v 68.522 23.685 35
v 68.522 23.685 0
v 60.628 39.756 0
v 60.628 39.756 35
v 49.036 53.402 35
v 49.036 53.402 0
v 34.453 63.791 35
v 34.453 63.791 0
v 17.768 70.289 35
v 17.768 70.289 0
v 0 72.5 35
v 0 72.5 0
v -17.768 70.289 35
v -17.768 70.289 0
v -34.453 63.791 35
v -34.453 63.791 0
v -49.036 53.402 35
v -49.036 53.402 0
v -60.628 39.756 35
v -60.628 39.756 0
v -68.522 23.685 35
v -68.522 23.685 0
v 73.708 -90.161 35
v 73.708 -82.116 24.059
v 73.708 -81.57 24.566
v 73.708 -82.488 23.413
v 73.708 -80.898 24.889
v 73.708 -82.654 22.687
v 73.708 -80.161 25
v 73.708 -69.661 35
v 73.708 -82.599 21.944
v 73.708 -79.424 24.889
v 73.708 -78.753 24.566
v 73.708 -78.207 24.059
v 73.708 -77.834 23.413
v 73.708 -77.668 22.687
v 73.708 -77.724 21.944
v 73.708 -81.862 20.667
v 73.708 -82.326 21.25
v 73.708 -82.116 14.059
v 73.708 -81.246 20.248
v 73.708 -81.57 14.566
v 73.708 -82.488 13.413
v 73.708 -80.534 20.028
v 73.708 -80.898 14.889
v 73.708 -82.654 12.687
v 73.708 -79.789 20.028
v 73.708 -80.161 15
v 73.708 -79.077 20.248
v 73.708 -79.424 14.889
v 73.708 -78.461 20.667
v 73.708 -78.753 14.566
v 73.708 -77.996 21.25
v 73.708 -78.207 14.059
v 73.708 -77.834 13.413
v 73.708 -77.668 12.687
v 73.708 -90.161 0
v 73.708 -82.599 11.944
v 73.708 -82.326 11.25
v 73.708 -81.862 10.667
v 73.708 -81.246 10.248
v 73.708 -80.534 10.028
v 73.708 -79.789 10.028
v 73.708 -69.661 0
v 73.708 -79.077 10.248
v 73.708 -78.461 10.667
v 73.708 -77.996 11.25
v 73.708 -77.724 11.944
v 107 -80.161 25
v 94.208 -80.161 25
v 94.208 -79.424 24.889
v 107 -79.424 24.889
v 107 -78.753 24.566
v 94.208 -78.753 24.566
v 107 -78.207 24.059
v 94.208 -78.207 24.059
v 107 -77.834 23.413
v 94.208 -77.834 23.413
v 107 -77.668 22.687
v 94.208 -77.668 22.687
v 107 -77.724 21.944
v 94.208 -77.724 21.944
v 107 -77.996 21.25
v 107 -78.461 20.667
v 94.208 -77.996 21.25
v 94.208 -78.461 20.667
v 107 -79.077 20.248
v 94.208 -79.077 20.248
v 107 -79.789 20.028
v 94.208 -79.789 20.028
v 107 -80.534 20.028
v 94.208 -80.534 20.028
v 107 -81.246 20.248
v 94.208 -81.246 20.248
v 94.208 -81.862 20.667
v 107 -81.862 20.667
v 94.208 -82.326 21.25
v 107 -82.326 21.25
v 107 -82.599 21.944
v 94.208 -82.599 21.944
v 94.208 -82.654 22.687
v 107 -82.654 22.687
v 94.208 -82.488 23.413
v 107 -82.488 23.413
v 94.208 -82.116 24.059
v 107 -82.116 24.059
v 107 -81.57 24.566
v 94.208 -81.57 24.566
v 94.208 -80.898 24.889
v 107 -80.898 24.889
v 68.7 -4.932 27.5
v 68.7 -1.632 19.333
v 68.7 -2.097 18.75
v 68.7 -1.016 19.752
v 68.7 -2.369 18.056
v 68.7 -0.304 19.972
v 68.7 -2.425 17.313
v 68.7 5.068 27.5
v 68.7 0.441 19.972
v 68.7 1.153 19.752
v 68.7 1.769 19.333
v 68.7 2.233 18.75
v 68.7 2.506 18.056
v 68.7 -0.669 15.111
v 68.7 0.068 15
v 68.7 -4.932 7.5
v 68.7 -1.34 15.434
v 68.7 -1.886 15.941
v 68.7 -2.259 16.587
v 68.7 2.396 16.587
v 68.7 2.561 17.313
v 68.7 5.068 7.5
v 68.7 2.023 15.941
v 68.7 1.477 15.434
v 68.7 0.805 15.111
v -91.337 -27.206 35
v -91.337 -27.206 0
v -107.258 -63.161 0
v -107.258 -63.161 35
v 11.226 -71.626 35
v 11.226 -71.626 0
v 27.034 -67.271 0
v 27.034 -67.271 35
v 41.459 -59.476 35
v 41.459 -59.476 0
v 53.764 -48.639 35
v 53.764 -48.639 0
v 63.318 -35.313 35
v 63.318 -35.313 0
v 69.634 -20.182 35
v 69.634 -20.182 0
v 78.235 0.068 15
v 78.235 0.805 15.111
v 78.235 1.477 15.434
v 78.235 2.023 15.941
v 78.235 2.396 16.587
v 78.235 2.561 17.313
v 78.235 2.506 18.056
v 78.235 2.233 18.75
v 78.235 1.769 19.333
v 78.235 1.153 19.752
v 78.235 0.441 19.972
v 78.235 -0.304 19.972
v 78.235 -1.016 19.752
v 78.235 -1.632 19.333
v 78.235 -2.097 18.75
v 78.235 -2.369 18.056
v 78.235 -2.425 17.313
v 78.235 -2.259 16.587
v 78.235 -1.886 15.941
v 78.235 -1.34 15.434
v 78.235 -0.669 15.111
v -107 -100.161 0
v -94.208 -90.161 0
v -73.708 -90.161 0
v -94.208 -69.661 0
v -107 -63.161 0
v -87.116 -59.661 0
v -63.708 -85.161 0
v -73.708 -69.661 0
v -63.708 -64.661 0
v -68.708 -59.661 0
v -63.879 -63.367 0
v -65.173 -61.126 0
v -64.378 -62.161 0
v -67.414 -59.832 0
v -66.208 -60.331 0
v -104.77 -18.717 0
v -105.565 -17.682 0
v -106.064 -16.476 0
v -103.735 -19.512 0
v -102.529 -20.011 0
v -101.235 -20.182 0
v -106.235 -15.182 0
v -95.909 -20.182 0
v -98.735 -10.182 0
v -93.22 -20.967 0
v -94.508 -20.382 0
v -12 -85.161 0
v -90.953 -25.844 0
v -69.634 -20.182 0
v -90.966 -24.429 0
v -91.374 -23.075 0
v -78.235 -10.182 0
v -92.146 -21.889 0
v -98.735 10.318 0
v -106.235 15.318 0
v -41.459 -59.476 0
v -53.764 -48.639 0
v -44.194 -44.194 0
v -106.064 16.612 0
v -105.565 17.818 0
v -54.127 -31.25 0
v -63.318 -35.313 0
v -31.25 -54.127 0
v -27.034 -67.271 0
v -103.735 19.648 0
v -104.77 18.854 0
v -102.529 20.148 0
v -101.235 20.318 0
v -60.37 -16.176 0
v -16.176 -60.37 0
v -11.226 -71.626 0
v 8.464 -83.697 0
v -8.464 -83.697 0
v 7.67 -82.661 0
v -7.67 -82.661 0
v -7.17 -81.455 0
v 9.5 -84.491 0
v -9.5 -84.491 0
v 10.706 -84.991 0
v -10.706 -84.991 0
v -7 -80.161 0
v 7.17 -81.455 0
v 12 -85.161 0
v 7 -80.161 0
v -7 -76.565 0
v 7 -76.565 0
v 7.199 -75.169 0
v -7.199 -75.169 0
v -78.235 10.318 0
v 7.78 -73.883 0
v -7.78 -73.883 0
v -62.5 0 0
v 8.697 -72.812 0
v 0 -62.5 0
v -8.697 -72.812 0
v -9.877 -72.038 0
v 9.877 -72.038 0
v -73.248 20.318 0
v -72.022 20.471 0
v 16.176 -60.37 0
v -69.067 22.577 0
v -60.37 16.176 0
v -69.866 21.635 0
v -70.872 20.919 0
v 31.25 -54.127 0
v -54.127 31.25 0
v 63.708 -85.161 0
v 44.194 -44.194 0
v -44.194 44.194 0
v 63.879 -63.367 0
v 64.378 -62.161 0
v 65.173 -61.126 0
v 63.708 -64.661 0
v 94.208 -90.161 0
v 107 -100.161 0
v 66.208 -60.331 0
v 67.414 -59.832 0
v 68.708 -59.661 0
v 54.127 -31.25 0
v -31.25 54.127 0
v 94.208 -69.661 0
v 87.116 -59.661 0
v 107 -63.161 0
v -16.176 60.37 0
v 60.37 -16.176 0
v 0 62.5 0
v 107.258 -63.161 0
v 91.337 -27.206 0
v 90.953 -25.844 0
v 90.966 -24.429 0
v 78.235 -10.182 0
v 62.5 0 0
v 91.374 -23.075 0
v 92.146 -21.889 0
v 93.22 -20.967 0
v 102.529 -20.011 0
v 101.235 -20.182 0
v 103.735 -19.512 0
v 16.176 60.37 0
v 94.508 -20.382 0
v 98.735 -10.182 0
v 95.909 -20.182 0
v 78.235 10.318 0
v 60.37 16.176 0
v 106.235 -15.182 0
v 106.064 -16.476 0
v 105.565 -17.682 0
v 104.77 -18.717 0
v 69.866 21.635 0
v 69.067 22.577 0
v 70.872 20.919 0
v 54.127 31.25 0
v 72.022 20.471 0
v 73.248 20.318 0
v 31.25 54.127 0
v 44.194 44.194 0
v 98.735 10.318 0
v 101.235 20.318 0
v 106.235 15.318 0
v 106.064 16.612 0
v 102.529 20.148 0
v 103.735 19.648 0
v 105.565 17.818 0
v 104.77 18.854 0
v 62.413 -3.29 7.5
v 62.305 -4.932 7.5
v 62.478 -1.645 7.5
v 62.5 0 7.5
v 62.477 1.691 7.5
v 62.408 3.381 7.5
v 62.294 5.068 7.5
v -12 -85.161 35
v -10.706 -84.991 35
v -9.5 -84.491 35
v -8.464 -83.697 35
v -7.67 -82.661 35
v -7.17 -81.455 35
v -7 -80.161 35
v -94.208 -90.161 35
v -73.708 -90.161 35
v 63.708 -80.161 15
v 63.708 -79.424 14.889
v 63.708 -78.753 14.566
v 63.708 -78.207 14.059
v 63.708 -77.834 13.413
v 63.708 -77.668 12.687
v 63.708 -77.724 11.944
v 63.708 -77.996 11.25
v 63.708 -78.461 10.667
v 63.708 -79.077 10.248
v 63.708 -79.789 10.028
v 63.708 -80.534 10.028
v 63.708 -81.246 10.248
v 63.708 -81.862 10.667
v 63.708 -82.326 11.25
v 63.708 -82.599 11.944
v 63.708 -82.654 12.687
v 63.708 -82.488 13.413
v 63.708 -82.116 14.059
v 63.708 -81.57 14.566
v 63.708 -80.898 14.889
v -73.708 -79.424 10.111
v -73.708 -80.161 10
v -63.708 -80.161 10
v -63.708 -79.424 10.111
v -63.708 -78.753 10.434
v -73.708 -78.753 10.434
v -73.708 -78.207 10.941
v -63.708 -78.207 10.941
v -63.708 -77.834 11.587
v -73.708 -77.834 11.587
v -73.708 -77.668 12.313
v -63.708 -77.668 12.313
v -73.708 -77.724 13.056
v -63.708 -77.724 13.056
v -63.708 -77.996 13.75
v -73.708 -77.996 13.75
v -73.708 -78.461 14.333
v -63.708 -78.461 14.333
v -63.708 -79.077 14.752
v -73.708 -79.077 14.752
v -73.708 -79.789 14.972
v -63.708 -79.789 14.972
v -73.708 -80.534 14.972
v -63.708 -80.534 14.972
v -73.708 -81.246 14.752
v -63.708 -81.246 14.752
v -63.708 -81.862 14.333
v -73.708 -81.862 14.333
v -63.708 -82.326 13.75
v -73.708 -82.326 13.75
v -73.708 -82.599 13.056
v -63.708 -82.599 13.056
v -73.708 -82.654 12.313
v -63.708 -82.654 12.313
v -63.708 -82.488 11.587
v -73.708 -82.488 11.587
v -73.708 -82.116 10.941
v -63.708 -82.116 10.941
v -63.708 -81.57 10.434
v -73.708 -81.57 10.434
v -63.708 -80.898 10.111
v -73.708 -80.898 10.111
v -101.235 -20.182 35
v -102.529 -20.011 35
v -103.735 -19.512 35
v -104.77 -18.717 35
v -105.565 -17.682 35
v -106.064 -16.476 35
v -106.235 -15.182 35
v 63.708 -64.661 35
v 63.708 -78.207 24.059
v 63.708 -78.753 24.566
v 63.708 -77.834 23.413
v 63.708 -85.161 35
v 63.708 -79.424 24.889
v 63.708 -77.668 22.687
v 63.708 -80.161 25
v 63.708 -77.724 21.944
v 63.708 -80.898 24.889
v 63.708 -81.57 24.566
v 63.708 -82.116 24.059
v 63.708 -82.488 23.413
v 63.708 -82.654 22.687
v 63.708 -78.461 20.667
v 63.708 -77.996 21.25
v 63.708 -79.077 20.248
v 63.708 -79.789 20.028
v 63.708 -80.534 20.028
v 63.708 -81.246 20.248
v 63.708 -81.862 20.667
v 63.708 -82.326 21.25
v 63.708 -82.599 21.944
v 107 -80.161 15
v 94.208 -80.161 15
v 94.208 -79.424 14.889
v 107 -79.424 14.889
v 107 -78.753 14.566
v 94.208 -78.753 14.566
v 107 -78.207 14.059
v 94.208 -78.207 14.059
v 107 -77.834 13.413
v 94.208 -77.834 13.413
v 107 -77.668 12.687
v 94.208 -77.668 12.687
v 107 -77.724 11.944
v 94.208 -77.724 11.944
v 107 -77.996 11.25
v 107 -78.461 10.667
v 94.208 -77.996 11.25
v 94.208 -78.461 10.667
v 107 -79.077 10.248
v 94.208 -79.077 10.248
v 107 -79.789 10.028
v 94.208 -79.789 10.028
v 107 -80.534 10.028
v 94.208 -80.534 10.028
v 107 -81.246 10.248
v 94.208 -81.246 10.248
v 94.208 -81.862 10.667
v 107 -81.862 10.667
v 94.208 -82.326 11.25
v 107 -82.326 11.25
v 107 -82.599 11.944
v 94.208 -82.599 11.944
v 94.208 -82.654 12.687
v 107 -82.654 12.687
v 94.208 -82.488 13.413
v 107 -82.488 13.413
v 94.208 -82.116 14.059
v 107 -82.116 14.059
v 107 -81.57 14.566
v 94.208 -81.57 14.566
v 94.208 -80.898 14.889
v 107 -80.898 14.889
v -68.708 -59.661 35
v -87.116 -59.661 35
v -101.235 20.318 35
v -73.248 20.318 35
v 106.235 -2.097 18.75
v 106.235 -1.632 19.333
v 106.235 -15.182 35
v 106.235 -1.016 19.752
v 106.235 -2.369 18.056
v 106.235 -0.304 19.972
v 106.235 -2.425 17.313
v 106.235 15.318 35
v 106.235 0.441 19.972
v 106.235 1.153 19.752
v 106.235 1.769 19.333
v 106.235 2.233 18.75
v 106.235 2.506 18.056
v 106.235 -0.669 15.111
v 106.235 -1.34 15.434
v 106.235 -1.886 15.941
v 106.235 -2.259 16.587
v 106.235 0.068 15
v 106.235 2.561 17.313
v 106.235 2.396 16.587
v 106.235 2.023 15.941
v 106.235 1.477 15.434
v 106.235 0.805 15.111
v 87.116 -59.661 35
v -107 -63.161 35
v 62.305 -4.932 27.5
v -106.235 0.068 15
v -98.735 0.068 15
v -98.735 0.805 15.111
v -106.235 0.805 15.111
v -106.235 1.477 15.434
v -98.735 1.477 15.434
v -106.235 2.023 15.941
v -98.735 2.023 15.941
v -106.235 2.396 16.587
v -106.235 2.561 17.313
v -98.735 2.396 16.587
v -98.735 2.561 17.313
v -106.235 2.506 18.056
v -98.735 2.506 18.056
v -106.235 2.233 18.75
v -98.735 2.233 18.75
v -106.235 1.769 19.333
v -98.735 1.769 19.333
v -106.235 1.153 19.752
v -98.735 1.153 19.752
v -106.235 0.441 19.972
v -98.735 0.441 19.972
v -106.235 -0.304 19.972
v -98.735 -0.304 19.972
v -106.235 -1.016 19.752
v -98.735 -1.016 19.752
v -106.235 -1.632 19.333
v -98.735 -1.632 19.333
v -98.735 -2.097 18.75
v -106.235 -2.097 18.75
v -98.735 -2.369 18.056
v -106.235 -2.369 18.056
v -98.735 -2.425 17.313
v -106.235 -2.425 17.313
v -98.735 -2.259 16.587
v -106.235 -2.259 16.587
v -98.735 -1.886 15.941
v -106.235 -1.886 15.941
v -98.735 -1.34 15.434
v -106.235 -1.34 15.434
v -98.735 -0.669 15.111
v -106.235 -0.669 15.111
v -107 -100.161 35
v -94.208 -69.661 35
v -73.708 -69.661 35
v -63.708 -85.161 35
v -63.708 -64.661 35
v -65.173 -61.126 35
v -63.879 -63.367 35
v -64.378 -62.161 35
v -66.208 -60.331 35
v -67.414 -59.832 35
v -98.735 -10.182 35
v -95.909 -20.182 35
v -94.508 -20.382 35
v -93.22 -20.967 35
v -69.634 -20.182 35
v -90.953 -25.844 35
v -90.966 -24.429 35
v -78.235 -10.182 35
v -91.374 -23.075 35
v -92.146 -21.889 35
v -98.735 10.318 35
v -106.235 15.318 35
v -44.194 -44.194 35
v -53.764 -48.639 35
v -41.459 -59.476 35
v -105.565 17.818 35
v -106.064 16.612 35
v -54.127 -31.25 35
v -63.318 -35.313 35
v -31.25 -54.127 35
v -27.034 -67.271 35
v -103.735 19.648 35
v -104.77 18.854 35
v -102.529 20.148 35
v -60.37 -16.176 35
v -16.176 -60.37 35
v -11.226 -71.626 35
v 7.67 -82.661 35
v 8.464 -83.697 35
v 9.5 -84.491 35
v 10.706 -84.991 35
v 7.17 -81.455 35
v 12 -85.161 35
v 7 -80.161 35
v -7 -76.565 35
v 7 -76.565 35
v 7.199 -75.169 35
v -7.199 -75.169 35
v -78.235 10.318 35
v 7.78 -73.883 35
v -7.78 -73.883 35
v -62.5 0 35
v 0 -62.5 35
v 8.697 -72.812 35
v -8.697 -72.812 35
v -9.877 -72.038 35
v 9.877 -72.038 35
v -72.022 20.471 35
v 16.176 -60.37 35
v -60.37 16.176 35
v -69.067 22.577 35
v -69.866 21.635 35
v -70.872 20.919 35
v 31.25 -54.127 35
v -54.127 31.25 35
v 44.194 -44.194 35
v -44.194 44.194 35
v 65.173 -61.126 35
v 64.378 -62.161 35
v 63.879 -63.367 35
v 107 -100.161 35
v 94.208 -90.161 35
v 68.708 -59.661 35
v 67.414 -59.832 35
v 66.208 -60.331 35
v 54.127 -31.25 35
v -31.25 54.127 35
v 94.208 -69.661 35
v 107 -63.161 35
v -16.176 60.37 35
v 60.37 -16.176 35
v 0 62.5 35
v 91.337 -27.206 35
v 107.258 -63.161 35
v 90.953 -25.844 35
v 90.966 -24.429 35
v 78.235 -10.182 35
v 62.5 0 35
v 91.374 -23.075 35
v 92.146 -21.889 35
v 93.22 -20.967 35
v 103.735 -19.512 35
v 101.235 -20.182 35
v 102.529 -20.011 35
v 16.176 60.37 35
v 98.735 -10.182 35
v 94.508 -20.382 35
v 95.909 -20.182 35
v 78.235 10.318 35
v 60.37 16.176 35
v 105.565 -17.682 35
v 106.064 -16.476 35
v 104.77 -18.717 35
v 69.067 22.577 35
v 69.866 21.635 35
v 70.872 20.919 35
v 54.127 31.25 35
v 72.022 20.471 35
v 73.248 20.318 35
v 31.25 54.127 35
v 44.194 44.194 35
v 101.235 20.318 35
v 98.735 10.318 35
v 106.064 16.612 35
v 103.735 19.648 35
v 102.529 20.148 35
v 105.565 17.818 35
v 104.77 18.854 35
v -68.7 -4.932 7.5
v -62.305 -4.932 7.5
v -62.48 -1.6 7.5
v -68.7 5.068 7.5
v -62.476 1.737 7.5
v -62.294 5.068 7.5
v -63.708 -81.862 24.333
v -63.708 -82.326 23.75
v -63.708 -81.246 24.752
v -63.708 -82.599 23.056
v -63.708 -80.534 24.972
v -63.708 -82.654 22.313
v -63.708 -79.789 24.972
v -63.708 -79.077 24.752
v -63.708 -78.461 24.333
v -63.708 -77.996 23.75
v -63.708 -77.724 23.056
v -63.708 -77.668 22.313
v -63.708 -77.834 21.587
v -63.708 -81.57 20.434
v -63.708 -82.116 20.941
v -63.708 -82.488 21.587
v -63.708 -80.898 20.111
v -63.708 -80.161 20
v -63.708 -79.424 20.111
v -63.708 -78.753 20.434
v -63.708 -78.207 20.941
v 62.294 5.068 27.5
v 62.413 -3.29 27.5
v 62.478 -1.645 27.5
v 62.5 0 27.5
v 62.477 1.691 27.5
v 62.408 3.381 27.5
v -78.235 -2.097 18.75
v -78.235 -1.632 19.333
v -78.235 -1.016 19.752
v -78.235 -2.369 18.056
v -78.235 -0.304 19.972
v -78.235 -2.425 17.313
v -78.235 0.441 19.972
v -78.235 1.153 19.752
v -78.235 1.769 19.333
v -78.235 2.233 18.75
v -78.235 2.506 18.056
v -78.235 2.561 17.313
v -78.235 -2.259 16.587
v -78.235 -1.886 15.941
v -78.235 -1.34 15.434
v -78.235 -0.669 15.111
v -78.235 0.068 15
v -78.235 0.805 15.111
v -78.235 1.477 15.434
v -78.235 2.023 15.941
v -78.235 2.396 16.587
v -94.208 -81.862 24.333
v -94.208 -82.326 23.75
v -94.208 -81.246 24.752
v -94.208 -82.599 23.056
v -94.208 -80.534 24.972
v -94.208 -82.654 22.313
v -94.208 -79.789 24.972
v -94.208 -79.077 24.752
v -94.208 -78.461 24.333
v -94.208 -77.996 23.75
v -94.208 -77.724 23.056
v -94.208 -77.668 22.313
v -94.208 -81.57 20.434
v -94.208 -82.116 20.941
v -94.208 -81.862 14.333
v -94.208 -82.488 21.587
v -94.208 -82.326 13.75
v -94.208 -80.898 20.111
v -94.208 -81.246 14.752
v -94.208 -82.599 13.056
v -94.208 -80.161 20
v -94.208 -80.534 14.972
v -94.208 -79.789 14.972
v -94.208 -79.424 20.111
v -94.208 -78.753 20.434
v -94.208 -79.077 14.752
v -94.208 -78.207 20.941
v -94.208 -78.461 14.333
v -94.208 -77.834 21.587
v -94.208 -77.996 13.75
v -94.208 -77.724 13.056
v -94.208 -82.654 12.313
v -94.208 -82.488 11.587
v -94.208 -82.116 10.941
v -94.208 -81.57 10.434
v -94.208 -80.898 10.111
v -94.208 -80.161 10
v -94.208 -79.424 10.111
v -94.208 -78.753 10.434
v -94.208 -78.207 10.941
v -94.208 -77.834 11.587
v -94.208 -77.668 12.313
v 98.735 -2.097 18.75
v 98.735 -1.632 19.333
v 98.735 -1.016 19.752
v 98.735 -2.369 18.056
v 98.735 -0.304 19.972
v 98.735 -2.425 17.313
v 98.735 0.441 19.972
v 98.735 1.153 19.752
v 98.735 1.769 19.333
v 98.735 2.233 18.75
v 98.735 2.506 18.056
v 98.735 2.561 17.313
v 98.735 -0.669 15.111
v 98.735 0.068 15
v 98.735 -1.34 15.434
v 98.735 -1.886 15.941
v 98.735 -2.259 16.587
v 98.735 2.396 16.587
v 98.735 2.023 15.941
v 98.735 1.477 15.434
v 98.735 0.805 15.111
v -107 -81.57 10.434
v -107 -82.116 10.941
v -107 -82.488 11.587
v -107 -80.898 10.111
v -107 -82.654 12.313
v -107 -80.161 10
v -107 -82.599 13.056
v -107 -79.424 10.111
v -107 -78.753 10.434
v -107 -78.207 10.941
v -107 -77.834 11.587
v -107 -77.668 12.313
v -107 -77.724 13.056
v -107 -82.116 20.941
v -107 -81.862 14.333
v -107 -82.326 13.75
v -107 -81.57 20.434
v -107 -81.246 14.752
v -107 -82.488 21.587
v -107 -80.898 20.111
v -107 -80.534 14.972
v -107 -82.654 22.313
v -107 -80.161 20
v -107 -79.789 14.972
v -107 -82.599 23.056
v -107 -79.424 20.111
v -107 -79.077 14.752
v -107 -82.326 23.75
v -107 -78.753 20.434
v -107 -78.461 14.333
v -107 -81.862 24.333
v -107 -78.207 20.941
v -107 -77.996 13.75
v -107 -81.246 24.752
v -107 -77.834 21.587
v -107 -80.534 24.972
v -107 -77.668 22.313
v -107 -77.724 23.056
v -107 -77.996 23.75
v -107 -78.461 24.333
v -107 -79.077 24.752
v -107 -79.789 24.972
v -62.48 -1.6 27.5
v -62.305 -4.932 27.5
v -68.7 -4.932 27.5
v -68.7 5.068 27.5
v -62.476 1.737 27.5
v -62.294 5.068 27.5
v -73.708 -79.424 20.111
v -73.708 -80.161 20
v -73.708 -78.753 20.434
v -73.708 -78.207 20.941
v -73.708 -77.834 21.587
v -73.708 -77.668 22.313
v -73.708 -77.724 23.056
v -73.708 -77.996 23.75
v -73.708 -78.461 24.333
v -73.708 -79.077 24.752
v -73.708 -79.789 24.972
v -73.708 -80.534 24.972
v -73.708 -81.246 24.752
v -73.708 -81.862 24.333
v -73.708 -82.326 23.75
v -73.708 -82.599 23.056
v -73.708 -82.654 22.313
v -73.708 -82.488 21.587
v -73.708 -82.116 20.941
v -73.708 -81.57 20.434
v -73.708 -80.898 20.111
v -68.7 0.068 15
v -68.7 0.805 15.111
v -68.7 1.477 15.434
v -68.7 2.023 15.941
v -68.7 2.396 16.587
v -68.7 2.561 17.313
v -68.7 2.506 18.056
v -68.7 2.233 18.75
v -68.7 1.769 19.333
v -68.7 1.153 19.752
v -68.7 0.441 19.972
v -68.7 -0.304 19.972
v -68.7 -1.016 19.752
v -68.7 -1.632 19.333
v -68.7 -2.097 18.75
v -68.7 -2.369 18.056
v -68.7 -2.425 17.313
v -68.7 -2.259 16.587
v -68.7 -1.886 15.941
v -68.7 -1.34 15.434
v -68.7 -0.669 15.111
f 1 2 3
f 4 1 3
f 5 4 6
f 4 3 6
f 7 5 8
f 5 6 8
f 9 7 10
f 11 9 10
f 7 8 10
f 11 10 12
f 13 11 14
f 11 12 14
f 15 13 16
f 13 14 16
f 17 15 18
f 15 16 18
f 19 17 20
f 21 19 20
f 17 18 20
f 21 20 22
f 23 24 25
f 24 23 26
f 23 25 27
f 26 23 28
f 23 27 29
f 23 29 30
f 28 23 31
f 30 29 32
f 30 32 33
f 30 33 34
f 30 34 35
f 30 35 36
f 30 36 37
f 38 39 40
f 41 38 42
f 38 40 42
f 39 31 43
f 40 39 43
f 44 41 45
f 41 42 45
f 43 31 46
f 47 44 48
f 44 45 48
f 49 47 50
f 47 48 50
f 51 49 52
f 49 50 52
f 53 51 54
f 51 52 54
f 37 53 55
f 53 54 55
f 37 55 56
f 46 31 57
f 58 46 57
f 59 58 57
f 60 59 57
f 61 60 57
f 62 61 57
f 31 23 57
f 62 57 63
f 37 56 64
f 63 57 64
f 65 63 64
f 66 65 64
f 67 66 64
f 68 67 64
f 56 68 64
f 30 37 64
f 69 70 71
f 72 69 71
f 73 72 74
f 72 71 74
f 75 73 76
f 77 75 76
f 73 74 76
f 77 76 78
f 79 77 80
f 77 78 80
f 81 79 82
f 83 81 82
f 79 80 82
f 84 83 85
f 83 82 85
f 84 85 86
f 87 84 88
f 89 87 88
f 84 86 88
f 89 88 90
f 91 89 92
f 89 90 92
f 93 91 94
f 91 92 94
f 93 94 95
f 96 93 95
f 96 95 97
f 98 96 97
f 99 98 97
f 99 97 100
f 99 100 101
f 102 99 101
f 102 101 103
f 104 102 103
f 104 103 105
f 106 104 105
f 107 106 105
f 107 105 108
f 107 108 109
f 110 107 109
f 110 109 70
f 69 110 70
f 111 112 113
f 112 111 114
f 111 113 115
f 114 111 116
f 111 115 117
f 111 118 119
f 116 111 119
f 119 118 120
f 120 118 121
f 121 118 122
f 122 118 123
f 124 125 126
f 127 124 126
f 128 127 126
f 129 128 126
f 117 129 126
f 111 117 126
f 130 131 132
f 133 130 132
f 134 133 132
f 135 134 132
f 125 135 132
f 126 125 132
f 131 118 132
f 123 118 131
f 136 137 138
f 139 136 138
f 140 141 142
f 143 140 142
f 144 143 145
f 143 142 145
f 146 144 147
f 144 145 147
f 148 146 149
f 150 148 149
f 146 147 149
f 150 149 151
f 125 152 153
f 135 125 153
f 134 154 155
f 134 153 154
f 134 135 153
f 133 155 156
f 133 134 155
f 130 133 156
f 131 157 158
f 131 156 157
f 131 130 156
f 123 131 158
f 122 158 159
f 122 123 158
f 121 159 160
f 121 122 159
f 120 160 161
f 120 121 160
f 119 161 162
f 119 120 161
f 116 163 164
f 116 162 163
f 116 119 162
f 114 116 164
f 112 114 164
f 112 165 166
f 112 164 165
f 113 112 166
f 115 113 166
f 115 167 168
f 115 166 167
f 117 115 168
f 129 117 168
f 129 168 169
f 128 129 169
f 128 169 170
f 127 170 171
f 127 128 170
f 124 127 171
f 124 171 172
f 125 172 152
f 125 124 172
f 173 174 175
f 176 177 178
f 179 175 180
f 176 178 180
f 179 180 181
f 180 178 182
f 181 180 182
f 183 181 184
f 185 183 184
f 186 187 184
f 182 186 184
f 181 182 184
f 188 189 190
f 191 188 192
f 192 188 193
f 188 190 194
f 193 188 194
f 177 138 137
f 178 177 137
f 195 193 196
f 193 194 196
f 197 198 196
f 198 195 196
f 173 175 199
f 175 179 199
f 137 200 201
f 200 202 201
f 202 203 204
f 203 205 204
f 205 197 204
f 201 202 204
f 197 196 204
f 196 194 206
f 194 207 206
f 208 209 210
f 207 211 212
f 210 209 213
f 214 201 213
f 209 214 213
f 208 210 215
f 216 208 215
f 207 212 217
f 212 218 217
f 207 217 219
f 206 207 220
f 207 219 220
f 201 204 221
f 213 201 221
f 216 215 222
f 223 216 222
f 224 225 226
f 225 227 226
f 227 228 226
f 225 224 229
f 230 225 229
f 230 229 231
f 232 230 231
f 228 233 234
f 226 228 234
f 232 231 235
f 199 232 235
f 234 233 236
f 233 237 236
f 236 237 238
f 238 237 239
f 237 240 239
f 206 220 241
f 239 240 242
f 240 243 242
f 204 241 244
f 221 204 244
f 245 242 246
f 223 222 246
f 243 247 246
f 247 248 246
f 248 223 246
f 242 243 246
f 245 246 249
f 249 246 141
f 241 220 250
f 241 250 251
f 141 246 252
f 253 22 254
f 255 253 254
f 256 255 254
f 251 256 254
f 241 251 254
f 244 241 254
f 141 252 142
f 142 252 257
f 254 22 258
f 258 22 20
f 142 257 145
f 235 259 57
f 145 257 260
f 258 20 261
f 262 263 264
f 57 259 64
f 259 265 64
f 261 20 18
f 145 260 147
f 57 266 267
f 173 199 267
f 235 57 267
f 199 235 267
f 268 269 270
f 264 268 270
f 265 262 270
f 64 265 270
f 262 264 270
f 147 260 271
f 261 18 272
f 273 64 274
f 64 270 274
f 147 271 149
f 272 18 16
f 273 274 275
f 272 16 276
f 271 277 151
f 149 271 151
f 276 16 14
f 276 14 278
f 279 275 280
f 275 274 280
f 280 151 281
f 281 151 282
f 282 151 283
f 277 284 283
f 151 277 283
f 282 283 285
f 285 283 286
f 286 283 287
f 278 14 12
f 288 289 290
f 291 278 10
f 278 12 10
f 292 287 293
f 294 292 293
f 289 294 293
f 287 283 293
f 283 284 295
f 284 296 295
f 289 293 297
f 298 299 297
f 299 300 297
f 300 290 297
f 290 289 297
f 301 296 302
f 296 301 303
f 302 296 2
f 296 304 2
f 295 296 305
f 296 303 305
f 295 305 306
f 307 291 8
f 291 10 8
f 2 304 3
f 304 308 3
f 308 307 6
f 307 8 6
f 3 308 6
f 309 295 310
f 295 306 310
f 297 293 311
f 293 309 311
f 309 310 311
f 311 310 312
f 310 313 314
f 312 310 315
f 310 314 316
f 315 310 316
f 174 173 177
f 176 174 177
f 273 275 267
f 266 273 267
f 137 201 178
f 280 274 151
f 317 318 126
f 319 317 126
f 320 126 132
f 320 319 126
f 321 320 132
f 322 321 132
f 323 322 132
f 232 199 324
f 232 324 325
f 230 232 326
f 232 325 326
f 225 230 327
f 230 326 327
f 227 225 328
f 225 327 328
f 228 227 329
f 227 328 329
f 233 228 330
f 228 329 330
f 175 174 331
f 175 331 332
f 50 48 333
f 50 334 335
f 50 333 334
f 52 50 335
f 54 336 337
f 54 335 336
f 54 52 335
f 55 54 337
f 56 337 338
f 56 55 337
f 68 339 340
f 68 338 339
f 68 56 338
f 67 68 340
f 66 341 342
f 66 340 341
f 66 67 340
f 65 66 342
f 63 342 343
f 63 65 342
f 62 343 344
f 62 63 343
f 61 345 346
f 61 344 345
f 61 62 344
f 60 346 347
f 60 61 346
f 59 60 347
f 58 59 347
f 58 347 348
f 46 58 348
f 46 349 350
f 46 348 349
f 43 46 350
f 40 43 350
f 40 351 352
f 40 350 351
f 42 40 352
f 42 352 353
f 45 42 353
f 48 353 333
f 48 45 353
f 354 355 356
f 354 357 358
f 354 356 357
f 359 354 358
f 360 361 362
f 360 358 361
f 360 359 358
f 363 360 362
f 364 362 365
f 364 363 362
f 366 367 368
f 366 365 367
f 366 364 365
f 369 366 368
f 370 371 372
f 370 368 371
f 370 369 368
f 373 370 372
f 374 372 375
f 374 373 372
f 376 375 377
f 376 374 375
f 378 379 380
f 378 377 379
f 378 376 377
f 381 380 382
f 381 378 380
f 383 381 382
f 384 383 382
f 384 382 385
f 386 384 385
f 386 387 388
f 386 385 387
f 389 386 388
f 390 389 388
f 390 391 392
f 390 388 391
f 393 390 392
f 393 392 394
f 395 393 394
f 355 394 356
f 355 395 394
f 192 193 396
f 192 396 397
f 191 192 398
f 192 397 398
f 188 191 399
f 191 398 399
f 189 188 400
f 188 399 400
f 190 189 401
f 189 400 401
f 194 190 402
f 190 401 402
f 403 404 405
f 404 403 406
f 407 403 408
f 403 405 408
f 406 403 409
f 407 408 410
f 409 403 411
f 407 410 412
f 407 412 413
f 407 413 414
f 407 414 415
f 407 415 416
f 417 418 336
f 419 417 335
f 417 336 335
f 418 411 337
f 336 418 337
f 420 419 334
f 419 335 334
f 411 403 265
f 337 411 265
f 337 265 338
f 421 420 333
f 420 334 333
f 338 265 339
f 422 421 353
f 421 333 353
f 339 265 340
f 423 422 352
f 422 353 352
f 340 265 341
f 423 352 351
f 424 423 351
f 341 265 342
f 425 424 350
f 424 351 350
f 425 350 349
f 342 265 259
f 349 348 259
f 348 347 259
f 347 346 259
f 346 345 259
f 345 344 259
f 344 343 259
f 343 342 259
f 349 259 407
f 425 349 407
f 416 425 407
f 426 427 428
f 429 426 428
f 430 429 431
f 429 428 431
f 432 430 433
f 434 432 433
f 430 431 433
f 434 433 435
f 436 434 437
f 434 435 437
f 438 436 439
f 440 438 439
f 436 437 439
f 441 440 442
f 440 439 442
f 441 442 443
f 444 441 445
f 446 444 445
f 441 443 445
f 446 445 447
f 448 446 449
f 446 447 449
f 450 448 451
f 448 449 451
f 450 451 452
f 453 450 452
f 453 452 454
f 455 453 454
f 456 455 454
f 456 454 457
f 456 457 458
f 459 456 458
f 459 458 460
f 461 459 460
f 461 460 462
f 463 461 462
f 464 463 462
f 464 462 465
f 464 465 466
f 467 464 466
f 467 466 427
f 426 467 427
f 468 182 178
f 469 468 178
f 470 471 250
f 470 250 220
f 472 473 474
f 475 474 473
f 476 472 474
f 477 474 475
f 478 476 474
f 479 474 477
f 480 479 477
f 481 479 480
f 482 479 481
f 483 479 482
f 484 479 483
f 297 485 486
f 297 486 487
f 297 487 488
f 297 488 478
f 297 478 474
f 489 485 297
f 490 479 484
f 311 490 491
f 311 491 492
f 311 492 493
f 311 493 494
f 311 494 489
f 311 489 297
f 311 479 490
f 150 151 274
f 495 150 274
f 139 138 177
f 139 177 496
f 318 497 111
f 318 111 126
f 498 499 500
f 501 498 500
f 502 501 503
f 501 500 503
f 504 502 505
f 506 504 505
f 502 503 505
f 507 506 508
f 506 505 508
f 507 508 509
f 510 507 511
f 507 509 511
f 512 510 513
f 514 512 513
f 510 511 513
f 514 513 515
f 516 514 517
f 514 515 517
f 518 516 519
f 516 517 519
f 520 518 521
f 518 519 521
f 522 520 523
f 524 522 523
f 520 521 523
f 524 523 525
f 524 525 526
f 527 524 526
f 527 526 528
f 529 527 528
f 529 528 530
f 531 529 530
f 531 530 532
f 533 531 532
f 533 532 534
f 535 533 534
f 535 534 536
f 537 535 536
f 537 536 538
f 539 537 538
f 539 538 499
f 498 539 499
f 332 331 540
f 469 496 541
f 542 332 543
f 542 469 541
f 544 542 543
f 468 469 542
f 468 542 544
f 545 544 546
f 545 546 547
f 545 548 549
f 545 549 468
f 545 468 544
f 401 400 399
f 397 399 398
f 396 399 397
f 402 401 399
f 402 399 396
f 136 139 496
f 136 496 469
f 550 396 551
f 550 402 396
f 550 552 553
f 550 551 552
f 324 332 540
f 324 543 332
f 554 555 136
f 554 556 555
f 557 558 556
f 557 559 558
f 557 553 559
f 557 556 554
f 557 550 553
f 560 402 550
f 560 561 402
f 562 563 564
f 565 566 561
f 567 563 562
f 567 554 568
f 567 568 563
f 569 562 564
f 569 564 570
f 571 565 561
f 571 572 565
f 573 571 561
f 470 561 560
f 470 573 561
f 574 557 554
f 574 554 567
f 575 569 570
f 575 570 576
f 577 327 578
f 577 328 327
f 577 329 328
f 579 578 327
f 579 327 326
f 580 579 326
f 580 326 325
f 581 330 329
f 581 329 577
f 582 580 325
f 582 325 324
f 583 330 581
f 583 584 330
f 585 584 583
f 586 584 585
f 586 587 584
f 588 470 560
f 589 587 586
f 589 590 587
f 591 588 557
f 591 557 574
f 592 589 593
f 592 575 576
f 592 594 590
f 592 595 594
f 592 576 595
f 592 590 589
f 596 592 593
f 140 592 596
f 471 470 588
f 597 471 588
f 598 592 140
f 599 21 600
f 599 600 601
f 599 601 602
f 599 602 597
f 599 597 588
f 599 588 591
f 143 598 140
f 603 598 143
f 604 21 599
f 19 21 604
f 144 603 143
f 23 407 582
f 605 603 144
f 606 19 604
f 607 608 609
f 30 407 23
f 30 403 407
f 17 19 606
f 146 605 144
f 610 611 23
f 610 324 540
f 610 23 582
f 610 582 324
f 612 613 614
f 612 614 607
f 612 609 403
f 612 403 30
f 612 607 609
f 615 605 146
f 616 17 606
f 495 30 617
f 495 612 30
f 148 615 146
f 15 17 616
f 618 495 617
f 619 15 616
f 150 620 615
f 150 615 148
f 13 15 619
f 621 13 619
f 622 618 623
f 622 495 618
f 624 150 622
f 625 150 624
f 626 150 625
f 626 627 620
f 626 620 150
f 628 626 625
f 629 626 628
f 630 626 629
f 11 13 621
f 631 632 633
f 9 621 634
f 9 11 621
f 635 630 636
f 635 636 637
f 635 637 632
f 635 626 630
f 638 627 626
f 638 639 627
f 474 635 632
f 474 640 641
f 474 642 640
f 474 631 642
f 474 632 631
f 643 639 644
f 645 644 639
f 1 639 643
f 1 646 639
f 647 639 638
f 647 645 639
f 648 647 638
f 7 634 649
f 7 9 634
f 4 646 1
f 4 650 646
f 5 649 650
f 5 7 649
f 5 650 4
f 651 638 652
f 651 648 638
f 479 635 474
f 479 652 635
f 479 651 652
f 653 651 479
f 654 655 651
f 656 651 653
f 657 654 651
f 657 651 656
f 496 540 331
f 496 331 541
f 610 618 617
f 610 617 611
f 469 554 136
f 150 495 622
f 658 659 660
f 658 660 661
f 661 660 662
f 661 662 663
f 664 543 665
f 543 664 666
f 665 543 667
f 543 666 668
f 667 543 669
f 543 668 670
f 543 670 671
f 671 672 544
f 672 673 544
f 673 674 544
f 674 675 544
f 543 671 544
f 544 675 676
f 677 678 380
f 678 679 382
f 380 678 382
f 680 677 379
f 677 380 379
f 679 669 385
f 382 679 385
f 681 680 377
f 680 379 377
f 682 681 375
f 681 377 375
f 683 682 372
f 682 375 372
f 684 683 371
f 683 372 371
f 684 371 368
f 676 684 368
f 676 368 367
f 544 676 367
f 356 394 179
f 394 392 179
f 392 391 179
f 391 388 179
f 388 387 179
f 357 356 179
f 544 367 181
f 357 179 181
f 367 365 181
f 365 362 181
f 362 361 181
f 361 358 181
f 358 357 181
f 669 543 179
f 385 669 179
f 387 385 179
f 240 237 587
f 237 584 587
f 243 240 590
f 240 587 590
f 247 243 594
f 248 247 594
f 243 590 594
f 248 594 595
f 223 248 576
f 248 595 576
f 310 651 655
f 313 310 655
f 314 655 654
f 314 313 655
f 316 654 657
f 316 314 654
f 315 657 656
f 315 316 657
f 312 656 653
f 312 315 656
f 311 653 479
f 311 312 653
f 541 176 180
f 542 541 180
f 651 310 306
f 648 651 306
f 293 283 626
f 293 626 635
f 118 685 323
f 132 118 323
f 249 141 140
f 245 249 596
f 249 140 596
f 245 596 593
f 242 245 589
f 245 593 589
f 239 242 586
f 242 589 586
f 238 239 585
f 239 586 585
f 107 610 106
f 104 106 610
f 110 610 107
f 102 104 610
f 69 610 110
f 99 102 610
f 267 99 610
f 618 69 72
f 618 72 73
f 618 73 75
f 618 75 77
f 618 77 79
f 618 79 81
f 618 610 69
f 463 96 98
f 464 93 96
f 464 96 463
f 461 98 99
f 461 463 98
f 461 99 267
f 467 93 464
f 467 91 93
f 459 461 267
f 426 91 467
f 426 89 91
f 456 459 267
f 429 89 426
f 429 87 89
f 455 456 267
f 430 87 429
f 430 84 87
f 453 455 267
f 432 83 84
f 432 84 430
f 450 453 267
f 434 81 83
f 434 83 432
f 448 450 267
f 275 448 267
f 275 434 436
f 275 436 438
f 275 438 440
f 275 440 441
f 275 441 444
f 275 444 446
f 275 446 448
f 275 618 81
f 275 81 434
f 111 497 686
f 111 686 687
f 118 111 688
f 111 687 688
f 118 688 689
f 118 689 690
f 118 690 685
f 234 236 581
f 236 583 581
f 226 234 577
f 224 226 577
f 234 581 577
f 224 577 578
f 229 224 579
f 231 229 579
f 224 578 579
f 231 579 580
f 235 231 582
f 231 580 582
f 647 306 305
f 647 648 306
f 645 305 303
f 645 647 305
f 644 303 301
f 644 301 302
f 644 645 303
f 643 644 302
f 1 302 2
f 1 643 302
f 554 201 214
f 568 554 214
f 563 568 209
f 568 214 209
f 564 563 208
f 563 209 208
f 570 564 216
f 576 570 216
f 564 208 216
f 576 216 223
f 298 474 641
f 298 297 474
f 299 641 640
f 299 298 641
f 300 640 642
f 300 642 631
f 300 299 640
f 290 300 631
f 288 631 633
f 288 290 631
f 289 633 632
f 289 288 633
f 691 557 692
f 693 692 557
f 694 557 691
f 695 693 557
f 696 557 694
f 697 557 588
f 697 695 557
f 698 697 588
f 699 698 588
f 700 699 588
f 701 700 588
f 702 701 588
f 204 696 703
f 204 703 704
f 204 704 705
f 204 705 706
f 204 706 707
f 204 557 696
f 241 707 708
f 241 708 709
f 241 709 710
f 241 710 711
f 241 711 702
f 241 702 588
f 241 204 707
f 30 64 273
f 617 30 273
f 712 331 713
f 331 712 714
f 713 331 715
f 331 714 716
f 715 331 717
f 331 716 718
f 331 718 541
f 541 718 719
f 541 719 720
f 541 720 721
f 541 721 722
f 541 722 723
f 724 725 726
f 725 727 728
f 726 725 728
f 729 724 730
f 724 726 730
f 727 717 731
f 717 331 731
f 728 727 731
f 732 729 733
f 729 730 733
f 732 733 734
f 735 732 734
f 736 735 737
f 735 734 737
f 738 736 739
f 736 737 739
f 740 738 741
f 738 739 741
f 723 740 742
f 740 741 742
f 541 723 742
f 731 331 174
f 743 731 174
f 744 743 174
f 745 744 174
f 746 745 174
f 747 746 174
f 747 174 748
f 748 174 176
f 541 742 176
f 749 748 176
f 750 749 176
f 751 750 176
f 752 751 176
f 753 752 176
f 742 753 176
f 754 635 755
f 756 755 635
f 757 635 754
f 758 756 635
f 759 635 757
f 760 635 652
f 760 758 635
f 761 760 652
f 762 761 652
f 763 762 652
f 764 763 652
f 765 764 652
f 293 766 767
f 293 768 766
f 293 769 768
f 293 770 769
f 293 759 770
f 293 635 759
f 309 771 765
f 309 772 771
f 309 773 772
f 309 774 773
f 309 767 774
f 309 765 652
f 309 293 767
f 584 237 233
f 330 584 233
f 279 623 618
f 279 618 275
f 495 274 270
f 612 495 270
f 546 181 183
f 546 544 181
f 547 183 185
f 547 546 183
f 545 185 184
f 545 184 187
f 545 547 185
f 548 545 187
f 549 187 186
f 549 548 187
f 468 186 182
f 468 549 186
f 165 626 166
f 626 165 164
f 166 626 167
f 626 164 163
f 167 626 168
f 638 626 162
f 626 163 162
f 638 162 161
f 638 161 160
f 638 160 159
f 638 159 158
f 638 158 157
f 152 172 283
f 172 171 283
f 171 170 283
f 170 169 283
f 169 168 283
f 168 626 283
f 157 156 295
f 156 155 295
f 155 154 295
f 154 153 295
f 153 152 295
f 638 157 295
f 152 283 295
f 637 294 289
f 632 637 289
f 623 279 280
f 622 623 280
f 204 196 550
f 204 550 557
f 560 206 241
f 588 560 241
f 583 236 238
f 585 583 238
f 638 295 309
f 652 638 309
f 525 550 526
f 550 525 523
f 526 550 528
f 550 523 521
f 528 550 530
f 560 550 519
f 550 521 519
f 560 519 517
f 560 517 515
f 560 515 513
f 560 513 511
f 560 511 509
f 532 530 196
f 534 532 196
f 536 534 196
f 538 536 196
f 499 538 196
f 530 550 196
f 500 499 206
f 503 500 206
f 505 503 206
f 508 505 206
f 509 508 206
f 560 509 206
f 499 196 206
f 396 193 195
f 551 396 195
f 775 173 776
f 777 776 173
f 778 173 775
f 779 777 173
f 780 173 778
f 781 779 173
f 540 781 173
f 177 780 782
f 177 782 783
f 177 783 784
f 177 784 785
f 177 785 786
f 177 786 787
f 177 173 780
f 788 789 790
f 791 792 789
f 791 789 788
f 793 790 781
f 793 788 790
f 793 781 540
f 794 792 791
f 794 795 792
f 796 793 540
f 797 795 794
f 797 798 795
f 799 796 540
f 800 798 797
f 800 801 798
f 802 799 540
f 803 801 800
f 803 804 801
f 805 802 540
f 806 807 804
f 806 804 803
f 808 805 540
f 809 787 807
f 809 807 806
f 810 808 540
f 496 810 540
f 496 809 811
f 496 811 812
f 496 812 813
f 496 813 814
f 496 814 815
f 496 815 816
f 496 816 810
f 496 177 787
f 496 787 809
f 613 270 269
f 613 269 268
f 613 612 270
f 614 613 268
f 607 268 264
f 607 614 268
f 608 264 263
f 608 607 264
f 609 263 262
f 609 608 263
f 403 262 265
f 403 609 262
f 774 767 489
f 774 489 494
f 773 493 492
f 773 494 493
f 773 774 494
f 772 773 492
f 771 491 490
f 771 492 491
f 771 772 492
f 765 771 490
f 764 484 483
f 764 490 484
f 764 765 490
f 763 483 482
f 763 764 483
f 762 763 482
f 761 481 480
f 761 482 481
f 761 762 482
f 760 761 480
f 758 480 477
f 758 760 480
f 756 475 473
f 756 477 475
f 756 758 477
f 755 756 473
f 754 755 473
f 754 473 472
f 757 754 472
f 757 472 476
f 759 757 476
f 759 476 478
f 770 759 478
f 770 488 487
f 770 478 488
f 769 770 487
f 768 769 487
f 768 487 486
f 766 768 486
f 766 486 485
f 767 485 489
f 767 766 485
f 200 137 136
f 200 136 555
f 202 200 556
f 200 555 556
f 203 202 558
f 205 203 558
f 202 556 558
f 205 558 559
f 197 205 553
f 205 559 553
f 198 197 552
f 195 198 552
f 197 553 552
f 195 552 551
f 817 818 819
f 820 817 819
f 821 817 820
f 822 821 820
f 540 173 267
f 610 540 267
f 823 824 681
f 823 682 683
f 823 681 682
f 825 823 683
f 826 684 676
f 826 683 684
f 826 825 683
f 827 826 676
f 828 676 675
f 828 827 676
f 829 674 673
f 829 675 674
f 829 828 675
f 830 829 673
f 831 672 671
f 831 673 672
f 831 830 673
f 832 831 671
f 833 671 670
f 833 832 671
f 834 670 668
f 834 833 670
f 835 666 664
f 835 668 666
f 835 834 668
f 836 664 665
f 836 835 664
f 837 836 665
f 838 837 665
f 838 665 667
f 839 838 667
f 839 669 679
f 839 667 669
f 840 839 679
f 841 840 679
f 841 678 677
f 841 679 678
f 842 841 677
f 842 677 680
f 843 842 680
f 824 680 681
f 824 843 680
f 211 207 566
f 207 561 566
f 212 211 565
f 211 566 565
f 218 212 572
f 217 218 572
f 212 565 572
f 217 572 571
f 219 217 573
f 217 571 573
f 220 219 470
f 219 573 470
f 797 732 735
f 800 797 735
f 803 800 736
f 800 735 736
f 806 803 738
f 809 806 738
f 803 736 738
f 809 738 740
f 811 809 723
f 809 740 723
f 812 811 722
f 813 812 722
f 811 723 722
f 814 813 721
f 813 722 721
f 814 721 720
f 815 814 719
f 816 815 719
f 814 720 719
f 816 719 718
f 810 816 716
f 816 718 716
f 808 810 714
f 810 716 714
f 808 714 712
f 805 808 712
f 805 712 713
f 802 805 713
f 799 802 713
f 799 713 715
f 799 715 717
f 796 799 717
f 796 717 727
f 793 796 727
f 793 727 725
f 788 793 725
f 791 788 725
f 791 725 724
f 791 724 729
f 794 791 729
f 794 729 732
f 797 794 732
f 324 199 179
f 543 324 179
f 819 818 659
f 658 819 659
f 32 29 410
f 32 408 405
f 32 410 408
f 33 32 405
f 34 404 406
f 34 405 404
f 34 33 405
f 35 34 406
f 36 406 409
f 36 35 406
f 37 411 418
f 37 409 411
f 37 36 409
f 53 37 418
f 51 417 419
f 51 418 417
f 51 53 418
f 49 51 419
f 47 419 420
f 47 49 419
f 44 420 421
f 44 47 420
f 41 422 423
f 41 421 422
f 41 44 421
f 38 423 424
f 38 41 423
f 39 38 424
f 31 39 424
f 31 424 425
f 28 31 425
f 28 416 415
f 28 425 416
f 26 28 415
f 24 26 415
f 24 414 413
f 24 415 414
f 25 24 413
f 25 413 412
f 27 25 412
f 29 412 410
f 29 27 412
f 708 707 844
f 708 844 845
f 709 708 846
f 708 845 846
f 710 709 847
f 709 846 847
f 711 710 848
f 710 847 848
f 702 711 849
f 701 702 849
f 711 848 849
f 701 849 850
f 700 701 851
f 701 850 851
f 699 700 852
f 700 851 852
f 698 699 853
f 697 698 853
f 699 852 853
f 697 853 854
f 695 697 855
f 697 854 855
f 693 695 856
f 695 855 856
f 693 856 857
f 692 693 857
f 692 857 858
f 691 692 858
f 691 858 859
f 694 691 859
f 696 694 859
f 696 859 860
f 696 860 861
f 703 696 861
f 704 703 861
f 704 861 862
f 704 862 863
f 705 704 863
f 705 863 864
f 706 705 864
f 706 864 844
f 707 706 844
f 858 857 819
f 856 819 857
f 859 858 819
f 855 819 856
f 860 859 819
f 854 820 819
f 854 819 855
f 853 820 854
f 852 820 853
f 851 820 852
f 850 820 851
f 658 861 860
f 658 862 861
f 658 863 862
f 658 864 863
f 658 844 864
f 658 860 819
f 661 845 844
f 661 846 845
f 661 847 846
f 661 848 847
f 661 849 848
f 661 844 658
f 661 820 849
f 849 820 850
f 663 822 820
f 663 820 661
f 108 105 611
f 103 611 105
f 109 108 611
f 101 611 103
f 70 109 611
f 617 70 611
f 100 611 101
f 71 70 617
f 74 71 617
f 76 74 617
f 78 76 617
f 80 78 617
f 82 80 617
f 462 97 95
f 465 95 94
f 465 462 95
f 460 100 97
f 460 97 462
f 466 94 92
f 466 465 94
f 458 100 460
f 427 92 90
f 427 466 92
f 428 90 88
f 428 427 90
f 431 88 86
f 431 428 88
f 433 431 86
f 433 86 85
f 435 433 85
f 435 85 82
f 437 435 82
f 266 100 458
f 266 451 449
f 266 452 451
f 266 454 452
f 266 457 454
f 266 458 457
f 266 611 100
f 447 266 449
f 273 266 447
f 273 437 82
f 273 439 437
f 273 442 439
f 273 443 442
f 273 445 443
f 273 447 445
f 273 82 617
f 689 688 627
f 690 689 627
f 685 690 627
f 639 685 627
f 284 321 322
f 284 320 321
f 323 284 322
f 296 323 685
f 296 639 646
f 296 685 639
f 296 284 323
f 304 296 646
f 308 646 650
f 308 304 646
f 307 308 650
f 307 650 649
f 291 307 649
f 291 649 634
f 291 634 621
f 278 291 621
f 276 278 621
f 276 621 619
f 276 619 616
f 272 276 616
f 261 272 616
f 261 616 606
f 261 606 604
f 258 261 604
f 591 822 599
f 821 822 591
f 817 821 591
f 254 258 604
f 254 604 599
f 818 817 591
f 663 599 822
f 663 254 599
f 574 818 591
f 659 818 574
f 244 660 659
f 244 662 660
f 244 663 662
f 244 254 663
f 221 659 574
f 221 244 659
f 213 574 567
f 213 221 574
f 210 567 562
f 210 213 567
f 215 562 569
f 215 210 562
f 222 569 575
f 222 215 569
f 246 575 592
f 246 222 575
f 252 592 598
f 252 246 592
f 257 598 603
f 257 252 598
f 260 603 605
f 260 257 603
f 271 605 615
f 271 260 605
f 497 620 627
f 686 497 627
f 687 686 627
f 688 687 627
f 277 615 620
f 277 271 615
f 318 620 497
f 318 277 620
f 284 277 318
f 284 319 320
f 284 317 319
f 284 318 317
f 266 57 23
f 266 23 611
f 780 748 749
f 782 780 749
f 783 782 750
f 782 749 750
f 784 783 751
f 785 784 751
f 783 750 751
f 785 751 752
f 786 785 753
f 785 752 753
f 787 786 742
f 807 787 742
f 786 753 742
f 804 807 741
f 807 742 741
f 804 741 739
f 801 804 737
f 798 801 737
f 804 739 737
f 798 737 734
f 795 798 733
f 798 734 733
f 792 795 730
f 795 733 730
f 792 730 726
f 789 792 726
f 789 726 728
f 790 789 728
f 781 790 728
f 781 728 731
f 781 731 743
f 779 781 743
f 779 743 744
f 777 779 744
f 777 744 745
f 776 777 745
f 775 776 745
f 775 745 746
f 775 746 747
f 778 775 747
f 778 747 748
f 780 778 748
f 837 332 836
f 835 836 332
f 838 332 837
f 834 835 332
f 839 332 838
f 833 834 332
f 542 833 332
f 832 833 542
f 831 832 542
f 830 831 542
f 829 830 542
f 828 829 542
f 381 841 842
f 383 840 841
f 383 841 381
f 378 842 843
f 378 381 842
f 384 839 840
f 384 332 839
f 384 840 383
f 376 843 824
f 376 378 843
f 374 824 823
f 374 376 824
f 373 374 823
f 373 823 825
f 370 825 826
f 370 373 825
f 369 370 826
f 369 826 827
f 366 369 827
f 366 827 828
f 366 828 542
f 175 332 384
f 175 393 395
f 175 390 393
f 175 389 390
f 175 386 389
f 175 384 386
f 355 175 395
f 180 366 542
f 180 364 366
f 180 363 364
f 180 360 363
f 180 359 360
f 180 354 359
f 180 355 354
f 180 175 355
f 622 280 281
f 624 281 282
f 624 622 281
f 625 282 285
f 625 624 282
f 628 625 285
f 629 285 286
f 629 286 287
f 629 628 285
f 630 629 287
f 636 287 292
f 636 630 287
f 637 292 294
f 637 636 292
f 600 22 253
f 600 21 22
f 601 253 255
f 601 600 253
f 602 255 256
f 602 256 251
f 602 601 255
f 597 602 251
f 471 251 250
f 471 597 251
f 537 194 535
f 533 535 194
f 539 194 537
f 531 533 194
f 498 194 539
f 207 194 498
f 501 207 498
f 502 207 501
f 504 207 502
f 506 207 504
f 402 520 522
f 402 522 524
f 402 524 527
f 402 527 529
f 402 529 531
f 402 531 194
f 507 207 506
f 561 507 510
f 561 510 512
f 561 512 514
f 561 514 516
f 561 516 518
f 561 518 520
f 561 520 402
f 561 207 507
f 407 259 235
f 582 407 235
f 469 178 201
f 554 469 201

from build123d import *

# Parameters (mm, degrees)
SKETCH1_W                = 20.5
SKETCH1_H                = 20.5
SKETCH1_R                = 62.5
BOSS_EXTRUDE1_DEPTH      = 35
FILLET2_R                = 5
SKETCH2_W                = 20
SKETCH2_H                = 10
CUT_EXTRUDE2_DEPTH       = 7
SKETCH3_W                = 20
SKETCH3_H                = 10
CUT_EXTRUDE3_DEPTH       = 7
SKETCH4_W                = 35
SKETCH4_H                = 37
CUT_EXTRUDE4_DEPTH       = 10
SKETCH5_W                = 35
SKETCH5_H                = 37
CUT_EXTRUDE5_DEPTH       = 10
SKETCH6_W                = 35
SKETCH6_H                = 40.5
CUT_EXTRUDE8_DEPTH       = 2.5
SKETCH7_W                = 35
SKETCH7_H                = 40.5
CUT_EXTRUDE9_DEPTH       = 2.5
FILLET3_R                = 5
SKETCH8_R                = 2.5
CUT_EXTRUDE10_DEPTH      = 194
CUT_EXTRUDE10_DEPTH_BACK = 48
SKETCH9_R                = 2.5
CUT_EXTRUDE11_DEPTH      = 48
CUT_EXTRUDE11_DEPTH_BACK = 48
SKETCH10_R               = 2.5
CUT_EXTRUDE12_DEPTH      = 48
CUT_EXTRUDE12_DEPTH_BACK = 48


with BuildPart() as part:
    # Sketch1 → Boss-Extrude1 (new body)
    with BuildSketch(Plane.XY):
        with BuildLine():
            Line((117, -100.161277705), (117, -85.161277705))
            Line((117, -85.161277705), (88.226517383, -20.181680312))
            Line((88.226517383, -20.181680312), (108.734784021, -20.181680312))
            Line((108.734784021, -20.181680312), (108.734784021, 20.318319688))
            Line((108.734784021, 20.318319688), (69.594654141, 20.318319688))
            ThreePointArc((69.594654141, 20.318319688), (0, 72.5), (-69.594654141, 20.318319688))
            Line((-69.594654141, 20.318319688), (-108.734784021, 20.318319688))
            Line((-108.734784021, 20.318319688), (-108.734784021, -20.181680312))
            Line((-108.734784021, -20.181680312), (-88.226517383, -20.181680312))
            Line((-88.226517383, -20.181680312), (-117, -85.161277705))
            Line((-117, -85.161277705), (-117, -100.161277705))
            Line((-117, -100.161277705), (117, -100.161277705))
        make_face()
        with Locations((83.958397156, -79.911277705)):
            Rectangle(SKETCH1_W, SKETCH1_H, mode=Mode.SUBTRACT)
        with Locations((-83.958397156, -79.911277705)):
            Rectangle(SKETCH1_W, SKETCH1_H, mode=Mode.SUBTRACT)
        with BuildLine():
            Line((-63.708397156, -59.661277705), (-87.116280609, -59.661277705))
            Line((-87.116280609, -59.661277705), (-69.634400836, -20.181680312))
            ThreePointArc((-69.634400836, -20.181680312), (-46.29986484, -55.79043391), (-7, -72.161277705))
            Line((-7, -72.161277705), (-7, -85.161277705))
            Line((-7, -85.161277705), (-63.708397156, -85.161277705))
            Line((-63.708397156, -85.161277705), (-63.708397156, -59.661277705))
        make_face(mode=Mode.SUBTRACT)
        with BuildLine():
            Line((87.116280609, -59.661277705), (63.708397156, -59.661277705))
            Line((63.708397156, -59.661277705), (63.708397156, -85.161277705))
            Line((63.708397156, -85.161277705), (7, -85.161277705))
            Line((7, -85.161277705), (7, -72.161277705))
            ThreePointArc((7, -72.161277705), (46.29986484, -55.79043391), (69.634400836, -20.181680312))
            Line((69.634400836, -20.181680312), (87.116280609, -59.661277705))
        make_face(mode=Mode.SUBTRACT)
        with Locations((-88.484784021, 0.068319688)):
            Rectangle(SKETCH1_W, SKETCH1_H, mode=Mode.SUBTRACT)
        Circle(SKETCH1_R, mode=Mode.SUBTRACT)
        with Locations((88.484784021, 0.068319688)):
            Rectangle(SKETCH1_W, SKETCH1_H, mode=Mode.SUBTRACT)
    extrude(amount=BOSS_EXTRUDE1_DEPTH)

    # Fillet2
    fillet2_edges = [part.edges().sort_by_distance(p)[0] for p in [
        (-88.226517383, -20.181680312, 17.5),
        (-69.594654141, 20.318319688, 17.5),
        (69.594654141, 20.318319688, 17.5),
        (88.226517383, -20.181680312, 17.5),
        (7, -72.161277705, 17.5),
        (7, -85.161277705, 17.5),
        (63.708397156, -59.661277705, 17.5),
        (-63.708397156, -59.661277705, 17.5),
        (-7, -85.161277705, 17.5),
        (-7, -72.161277705, 17.5),
    ]]
    fillet(fillet2_edges, radius=FILLET2_R)

    # Sketch2 → Cut-Extrude2 (cut)
    with BuildSketch(Plane(origin=(61.7, 0, 0), x_dir=(0, 0, -1), z_dir=(1, 0, 0))):
        with Locations((-17.5, 0.068319688)):
            Rectangle(SKETCH2_W, SKETCH2_H)
    extrude(amount=CUT_EXTRUDE2_DEPTH, mode=Mode.SUBTRACT)

    # Sketch3 → Cut-Extrude3 (cut)
    with BuildSketch(Plane(origin=(-61.7, 0, 0), x_dir=(0, 0, -1), z_dir=(1, 0, 0))):
        with Locations((-17.5, 0.068319688)):
            Rectangle(SKETCH3_W, SKETCH3_H)
    extrude(amount=-CUT_EXTRUDE3_DEPTH, mode=Mode.SUBTRACT)

    # Sketch4 → Cut-Extrude4 (cut)
    with BuildSketch(Plane(origin=(117, 0, 0), x_dir=(0, 0, -1), z_dir=(1, 0, 0))):
        with Locations((-17.5, -81.661277705)):
            Rectangle(SKETCH4_W, SKETCH4_H)
    extrude(amount=-CUT_EXTRUDE4_DEPTH, mode=Mode.SUBTRACT)

    # Sketch5 → Cut-Extrude5 (cut)
    with BuildSketch(Plane.ZY.offset(117)):
        with Locations((17.5, -81.661277705)):
            Rectangle(SKETCH5_W, SKETCH5_H)
    extrude(amount=-CUT_EXTRUDE5_DEPTH, mode=Mode.SUBTRACT)

    # Sketch6 → Cut-Extrude8 (cut)
    with BuildSketch(Plane(origin=(108.734784021, 0, 0), x_dir=(0, 0, -1), z_dir=(1, 0, 0))):
        with Locations((-17.5, 0.068319688)):
            Rectangle(SKETCH6_W, SKETCH6_H)
    extrude(amount=-CUT_EXTRUDE8_DEPTH, mode=Mode.SUBTRACT)

    # Sketch7 → Cut-Extrude9 (cut)
    with BuildSketch(Plane.ZY.offset(108.734784021)):
        with Locations((17.5, 0.068319688)):
            Rectangle(SKETCH7_W, SKETCH7_H)
    extrude(amount=-CUT_EXTRUDE9_DEPTH, mode=Mode.SUBTRACT)

    # Fillet3
    fillet3_edges = [part.edges().sort_by_distance(p)[0] for p in [
        (106.234784021, 20.318319688, 17.5),
        (106.234784021, -20.181680312, 17.5),
        (-106.234784021, 20.318319688, 17.5),
        (-106.234784021, -20.181680312, 17.5),
    ]]
    fillet(fillet3_edges, radius=FILLET3_R)

    # Sketch8 → Cut-Extrude10 (cut, two sides)
    with BuildSketch(Plane(origin=(-68.7, 0, 0), x_dir=(0, 0, -1), z_dir=(1, 0, 0))) as cut_extrude10_sk:
        with Locations((-17.5, 0.068319688)):
            Circle(SKETCH8_R)
    extrude(amount=CUT_EXTRUDE10_DEPTH, mode=Mode.SUBTRACT)
    extrude(cut_extrude10_sk.sketch, amount=-CUT_EXTRUDE10_DEPTH_BACK, mode=Mode.SUBTRACT)

    # Sketch9 → Cut-Extrude11 (cut, two sides)
    with BuildSketch(Plane(origin=(-94.208397156, 0, 0), x_dir=(0, 0, -1), z_dir=(1, 0, 0))) as cut_extrude11_sk:
        with Locations((-22.5, -80.161277705)):
            Circle(SKETCH9_R)
        with Locations((-12.5, -80.161277705)):
            Circle(SKETCH9_R)
    extrude(amount=CUT_EXTRUDE11_DEPTH, mode=Mode.SUBTRACT)
    extrude(cut_extrude11_sk.sketch, amount=-CUT_EXTRUDE11_DEPTH_BACK, mode=Mode.SUBTRACT)

    # Sketch10 → Cut-Extrude12 (cut, two sides)
    with BuildSketch(Plane.ZY.offset(-94.208397156)) as cut_extrude12_sk:
        with Locations((12.5, -80.161277705)):
            Circle(SKETCH10_R)
        with Locations((22.5, -80.161277705)):
            Circle(SKETCH10_R)
    extrude(amount=CUT_EXTRUDE12_DEPTH, mode=Mode.SUBTRACT)
    extrude(cut_extrude12_sk.sketch, amount=-CUT_EXTRUDE12_DEPTH_BACK, mode=Mode.SUBTRACT)


solid = part.part
